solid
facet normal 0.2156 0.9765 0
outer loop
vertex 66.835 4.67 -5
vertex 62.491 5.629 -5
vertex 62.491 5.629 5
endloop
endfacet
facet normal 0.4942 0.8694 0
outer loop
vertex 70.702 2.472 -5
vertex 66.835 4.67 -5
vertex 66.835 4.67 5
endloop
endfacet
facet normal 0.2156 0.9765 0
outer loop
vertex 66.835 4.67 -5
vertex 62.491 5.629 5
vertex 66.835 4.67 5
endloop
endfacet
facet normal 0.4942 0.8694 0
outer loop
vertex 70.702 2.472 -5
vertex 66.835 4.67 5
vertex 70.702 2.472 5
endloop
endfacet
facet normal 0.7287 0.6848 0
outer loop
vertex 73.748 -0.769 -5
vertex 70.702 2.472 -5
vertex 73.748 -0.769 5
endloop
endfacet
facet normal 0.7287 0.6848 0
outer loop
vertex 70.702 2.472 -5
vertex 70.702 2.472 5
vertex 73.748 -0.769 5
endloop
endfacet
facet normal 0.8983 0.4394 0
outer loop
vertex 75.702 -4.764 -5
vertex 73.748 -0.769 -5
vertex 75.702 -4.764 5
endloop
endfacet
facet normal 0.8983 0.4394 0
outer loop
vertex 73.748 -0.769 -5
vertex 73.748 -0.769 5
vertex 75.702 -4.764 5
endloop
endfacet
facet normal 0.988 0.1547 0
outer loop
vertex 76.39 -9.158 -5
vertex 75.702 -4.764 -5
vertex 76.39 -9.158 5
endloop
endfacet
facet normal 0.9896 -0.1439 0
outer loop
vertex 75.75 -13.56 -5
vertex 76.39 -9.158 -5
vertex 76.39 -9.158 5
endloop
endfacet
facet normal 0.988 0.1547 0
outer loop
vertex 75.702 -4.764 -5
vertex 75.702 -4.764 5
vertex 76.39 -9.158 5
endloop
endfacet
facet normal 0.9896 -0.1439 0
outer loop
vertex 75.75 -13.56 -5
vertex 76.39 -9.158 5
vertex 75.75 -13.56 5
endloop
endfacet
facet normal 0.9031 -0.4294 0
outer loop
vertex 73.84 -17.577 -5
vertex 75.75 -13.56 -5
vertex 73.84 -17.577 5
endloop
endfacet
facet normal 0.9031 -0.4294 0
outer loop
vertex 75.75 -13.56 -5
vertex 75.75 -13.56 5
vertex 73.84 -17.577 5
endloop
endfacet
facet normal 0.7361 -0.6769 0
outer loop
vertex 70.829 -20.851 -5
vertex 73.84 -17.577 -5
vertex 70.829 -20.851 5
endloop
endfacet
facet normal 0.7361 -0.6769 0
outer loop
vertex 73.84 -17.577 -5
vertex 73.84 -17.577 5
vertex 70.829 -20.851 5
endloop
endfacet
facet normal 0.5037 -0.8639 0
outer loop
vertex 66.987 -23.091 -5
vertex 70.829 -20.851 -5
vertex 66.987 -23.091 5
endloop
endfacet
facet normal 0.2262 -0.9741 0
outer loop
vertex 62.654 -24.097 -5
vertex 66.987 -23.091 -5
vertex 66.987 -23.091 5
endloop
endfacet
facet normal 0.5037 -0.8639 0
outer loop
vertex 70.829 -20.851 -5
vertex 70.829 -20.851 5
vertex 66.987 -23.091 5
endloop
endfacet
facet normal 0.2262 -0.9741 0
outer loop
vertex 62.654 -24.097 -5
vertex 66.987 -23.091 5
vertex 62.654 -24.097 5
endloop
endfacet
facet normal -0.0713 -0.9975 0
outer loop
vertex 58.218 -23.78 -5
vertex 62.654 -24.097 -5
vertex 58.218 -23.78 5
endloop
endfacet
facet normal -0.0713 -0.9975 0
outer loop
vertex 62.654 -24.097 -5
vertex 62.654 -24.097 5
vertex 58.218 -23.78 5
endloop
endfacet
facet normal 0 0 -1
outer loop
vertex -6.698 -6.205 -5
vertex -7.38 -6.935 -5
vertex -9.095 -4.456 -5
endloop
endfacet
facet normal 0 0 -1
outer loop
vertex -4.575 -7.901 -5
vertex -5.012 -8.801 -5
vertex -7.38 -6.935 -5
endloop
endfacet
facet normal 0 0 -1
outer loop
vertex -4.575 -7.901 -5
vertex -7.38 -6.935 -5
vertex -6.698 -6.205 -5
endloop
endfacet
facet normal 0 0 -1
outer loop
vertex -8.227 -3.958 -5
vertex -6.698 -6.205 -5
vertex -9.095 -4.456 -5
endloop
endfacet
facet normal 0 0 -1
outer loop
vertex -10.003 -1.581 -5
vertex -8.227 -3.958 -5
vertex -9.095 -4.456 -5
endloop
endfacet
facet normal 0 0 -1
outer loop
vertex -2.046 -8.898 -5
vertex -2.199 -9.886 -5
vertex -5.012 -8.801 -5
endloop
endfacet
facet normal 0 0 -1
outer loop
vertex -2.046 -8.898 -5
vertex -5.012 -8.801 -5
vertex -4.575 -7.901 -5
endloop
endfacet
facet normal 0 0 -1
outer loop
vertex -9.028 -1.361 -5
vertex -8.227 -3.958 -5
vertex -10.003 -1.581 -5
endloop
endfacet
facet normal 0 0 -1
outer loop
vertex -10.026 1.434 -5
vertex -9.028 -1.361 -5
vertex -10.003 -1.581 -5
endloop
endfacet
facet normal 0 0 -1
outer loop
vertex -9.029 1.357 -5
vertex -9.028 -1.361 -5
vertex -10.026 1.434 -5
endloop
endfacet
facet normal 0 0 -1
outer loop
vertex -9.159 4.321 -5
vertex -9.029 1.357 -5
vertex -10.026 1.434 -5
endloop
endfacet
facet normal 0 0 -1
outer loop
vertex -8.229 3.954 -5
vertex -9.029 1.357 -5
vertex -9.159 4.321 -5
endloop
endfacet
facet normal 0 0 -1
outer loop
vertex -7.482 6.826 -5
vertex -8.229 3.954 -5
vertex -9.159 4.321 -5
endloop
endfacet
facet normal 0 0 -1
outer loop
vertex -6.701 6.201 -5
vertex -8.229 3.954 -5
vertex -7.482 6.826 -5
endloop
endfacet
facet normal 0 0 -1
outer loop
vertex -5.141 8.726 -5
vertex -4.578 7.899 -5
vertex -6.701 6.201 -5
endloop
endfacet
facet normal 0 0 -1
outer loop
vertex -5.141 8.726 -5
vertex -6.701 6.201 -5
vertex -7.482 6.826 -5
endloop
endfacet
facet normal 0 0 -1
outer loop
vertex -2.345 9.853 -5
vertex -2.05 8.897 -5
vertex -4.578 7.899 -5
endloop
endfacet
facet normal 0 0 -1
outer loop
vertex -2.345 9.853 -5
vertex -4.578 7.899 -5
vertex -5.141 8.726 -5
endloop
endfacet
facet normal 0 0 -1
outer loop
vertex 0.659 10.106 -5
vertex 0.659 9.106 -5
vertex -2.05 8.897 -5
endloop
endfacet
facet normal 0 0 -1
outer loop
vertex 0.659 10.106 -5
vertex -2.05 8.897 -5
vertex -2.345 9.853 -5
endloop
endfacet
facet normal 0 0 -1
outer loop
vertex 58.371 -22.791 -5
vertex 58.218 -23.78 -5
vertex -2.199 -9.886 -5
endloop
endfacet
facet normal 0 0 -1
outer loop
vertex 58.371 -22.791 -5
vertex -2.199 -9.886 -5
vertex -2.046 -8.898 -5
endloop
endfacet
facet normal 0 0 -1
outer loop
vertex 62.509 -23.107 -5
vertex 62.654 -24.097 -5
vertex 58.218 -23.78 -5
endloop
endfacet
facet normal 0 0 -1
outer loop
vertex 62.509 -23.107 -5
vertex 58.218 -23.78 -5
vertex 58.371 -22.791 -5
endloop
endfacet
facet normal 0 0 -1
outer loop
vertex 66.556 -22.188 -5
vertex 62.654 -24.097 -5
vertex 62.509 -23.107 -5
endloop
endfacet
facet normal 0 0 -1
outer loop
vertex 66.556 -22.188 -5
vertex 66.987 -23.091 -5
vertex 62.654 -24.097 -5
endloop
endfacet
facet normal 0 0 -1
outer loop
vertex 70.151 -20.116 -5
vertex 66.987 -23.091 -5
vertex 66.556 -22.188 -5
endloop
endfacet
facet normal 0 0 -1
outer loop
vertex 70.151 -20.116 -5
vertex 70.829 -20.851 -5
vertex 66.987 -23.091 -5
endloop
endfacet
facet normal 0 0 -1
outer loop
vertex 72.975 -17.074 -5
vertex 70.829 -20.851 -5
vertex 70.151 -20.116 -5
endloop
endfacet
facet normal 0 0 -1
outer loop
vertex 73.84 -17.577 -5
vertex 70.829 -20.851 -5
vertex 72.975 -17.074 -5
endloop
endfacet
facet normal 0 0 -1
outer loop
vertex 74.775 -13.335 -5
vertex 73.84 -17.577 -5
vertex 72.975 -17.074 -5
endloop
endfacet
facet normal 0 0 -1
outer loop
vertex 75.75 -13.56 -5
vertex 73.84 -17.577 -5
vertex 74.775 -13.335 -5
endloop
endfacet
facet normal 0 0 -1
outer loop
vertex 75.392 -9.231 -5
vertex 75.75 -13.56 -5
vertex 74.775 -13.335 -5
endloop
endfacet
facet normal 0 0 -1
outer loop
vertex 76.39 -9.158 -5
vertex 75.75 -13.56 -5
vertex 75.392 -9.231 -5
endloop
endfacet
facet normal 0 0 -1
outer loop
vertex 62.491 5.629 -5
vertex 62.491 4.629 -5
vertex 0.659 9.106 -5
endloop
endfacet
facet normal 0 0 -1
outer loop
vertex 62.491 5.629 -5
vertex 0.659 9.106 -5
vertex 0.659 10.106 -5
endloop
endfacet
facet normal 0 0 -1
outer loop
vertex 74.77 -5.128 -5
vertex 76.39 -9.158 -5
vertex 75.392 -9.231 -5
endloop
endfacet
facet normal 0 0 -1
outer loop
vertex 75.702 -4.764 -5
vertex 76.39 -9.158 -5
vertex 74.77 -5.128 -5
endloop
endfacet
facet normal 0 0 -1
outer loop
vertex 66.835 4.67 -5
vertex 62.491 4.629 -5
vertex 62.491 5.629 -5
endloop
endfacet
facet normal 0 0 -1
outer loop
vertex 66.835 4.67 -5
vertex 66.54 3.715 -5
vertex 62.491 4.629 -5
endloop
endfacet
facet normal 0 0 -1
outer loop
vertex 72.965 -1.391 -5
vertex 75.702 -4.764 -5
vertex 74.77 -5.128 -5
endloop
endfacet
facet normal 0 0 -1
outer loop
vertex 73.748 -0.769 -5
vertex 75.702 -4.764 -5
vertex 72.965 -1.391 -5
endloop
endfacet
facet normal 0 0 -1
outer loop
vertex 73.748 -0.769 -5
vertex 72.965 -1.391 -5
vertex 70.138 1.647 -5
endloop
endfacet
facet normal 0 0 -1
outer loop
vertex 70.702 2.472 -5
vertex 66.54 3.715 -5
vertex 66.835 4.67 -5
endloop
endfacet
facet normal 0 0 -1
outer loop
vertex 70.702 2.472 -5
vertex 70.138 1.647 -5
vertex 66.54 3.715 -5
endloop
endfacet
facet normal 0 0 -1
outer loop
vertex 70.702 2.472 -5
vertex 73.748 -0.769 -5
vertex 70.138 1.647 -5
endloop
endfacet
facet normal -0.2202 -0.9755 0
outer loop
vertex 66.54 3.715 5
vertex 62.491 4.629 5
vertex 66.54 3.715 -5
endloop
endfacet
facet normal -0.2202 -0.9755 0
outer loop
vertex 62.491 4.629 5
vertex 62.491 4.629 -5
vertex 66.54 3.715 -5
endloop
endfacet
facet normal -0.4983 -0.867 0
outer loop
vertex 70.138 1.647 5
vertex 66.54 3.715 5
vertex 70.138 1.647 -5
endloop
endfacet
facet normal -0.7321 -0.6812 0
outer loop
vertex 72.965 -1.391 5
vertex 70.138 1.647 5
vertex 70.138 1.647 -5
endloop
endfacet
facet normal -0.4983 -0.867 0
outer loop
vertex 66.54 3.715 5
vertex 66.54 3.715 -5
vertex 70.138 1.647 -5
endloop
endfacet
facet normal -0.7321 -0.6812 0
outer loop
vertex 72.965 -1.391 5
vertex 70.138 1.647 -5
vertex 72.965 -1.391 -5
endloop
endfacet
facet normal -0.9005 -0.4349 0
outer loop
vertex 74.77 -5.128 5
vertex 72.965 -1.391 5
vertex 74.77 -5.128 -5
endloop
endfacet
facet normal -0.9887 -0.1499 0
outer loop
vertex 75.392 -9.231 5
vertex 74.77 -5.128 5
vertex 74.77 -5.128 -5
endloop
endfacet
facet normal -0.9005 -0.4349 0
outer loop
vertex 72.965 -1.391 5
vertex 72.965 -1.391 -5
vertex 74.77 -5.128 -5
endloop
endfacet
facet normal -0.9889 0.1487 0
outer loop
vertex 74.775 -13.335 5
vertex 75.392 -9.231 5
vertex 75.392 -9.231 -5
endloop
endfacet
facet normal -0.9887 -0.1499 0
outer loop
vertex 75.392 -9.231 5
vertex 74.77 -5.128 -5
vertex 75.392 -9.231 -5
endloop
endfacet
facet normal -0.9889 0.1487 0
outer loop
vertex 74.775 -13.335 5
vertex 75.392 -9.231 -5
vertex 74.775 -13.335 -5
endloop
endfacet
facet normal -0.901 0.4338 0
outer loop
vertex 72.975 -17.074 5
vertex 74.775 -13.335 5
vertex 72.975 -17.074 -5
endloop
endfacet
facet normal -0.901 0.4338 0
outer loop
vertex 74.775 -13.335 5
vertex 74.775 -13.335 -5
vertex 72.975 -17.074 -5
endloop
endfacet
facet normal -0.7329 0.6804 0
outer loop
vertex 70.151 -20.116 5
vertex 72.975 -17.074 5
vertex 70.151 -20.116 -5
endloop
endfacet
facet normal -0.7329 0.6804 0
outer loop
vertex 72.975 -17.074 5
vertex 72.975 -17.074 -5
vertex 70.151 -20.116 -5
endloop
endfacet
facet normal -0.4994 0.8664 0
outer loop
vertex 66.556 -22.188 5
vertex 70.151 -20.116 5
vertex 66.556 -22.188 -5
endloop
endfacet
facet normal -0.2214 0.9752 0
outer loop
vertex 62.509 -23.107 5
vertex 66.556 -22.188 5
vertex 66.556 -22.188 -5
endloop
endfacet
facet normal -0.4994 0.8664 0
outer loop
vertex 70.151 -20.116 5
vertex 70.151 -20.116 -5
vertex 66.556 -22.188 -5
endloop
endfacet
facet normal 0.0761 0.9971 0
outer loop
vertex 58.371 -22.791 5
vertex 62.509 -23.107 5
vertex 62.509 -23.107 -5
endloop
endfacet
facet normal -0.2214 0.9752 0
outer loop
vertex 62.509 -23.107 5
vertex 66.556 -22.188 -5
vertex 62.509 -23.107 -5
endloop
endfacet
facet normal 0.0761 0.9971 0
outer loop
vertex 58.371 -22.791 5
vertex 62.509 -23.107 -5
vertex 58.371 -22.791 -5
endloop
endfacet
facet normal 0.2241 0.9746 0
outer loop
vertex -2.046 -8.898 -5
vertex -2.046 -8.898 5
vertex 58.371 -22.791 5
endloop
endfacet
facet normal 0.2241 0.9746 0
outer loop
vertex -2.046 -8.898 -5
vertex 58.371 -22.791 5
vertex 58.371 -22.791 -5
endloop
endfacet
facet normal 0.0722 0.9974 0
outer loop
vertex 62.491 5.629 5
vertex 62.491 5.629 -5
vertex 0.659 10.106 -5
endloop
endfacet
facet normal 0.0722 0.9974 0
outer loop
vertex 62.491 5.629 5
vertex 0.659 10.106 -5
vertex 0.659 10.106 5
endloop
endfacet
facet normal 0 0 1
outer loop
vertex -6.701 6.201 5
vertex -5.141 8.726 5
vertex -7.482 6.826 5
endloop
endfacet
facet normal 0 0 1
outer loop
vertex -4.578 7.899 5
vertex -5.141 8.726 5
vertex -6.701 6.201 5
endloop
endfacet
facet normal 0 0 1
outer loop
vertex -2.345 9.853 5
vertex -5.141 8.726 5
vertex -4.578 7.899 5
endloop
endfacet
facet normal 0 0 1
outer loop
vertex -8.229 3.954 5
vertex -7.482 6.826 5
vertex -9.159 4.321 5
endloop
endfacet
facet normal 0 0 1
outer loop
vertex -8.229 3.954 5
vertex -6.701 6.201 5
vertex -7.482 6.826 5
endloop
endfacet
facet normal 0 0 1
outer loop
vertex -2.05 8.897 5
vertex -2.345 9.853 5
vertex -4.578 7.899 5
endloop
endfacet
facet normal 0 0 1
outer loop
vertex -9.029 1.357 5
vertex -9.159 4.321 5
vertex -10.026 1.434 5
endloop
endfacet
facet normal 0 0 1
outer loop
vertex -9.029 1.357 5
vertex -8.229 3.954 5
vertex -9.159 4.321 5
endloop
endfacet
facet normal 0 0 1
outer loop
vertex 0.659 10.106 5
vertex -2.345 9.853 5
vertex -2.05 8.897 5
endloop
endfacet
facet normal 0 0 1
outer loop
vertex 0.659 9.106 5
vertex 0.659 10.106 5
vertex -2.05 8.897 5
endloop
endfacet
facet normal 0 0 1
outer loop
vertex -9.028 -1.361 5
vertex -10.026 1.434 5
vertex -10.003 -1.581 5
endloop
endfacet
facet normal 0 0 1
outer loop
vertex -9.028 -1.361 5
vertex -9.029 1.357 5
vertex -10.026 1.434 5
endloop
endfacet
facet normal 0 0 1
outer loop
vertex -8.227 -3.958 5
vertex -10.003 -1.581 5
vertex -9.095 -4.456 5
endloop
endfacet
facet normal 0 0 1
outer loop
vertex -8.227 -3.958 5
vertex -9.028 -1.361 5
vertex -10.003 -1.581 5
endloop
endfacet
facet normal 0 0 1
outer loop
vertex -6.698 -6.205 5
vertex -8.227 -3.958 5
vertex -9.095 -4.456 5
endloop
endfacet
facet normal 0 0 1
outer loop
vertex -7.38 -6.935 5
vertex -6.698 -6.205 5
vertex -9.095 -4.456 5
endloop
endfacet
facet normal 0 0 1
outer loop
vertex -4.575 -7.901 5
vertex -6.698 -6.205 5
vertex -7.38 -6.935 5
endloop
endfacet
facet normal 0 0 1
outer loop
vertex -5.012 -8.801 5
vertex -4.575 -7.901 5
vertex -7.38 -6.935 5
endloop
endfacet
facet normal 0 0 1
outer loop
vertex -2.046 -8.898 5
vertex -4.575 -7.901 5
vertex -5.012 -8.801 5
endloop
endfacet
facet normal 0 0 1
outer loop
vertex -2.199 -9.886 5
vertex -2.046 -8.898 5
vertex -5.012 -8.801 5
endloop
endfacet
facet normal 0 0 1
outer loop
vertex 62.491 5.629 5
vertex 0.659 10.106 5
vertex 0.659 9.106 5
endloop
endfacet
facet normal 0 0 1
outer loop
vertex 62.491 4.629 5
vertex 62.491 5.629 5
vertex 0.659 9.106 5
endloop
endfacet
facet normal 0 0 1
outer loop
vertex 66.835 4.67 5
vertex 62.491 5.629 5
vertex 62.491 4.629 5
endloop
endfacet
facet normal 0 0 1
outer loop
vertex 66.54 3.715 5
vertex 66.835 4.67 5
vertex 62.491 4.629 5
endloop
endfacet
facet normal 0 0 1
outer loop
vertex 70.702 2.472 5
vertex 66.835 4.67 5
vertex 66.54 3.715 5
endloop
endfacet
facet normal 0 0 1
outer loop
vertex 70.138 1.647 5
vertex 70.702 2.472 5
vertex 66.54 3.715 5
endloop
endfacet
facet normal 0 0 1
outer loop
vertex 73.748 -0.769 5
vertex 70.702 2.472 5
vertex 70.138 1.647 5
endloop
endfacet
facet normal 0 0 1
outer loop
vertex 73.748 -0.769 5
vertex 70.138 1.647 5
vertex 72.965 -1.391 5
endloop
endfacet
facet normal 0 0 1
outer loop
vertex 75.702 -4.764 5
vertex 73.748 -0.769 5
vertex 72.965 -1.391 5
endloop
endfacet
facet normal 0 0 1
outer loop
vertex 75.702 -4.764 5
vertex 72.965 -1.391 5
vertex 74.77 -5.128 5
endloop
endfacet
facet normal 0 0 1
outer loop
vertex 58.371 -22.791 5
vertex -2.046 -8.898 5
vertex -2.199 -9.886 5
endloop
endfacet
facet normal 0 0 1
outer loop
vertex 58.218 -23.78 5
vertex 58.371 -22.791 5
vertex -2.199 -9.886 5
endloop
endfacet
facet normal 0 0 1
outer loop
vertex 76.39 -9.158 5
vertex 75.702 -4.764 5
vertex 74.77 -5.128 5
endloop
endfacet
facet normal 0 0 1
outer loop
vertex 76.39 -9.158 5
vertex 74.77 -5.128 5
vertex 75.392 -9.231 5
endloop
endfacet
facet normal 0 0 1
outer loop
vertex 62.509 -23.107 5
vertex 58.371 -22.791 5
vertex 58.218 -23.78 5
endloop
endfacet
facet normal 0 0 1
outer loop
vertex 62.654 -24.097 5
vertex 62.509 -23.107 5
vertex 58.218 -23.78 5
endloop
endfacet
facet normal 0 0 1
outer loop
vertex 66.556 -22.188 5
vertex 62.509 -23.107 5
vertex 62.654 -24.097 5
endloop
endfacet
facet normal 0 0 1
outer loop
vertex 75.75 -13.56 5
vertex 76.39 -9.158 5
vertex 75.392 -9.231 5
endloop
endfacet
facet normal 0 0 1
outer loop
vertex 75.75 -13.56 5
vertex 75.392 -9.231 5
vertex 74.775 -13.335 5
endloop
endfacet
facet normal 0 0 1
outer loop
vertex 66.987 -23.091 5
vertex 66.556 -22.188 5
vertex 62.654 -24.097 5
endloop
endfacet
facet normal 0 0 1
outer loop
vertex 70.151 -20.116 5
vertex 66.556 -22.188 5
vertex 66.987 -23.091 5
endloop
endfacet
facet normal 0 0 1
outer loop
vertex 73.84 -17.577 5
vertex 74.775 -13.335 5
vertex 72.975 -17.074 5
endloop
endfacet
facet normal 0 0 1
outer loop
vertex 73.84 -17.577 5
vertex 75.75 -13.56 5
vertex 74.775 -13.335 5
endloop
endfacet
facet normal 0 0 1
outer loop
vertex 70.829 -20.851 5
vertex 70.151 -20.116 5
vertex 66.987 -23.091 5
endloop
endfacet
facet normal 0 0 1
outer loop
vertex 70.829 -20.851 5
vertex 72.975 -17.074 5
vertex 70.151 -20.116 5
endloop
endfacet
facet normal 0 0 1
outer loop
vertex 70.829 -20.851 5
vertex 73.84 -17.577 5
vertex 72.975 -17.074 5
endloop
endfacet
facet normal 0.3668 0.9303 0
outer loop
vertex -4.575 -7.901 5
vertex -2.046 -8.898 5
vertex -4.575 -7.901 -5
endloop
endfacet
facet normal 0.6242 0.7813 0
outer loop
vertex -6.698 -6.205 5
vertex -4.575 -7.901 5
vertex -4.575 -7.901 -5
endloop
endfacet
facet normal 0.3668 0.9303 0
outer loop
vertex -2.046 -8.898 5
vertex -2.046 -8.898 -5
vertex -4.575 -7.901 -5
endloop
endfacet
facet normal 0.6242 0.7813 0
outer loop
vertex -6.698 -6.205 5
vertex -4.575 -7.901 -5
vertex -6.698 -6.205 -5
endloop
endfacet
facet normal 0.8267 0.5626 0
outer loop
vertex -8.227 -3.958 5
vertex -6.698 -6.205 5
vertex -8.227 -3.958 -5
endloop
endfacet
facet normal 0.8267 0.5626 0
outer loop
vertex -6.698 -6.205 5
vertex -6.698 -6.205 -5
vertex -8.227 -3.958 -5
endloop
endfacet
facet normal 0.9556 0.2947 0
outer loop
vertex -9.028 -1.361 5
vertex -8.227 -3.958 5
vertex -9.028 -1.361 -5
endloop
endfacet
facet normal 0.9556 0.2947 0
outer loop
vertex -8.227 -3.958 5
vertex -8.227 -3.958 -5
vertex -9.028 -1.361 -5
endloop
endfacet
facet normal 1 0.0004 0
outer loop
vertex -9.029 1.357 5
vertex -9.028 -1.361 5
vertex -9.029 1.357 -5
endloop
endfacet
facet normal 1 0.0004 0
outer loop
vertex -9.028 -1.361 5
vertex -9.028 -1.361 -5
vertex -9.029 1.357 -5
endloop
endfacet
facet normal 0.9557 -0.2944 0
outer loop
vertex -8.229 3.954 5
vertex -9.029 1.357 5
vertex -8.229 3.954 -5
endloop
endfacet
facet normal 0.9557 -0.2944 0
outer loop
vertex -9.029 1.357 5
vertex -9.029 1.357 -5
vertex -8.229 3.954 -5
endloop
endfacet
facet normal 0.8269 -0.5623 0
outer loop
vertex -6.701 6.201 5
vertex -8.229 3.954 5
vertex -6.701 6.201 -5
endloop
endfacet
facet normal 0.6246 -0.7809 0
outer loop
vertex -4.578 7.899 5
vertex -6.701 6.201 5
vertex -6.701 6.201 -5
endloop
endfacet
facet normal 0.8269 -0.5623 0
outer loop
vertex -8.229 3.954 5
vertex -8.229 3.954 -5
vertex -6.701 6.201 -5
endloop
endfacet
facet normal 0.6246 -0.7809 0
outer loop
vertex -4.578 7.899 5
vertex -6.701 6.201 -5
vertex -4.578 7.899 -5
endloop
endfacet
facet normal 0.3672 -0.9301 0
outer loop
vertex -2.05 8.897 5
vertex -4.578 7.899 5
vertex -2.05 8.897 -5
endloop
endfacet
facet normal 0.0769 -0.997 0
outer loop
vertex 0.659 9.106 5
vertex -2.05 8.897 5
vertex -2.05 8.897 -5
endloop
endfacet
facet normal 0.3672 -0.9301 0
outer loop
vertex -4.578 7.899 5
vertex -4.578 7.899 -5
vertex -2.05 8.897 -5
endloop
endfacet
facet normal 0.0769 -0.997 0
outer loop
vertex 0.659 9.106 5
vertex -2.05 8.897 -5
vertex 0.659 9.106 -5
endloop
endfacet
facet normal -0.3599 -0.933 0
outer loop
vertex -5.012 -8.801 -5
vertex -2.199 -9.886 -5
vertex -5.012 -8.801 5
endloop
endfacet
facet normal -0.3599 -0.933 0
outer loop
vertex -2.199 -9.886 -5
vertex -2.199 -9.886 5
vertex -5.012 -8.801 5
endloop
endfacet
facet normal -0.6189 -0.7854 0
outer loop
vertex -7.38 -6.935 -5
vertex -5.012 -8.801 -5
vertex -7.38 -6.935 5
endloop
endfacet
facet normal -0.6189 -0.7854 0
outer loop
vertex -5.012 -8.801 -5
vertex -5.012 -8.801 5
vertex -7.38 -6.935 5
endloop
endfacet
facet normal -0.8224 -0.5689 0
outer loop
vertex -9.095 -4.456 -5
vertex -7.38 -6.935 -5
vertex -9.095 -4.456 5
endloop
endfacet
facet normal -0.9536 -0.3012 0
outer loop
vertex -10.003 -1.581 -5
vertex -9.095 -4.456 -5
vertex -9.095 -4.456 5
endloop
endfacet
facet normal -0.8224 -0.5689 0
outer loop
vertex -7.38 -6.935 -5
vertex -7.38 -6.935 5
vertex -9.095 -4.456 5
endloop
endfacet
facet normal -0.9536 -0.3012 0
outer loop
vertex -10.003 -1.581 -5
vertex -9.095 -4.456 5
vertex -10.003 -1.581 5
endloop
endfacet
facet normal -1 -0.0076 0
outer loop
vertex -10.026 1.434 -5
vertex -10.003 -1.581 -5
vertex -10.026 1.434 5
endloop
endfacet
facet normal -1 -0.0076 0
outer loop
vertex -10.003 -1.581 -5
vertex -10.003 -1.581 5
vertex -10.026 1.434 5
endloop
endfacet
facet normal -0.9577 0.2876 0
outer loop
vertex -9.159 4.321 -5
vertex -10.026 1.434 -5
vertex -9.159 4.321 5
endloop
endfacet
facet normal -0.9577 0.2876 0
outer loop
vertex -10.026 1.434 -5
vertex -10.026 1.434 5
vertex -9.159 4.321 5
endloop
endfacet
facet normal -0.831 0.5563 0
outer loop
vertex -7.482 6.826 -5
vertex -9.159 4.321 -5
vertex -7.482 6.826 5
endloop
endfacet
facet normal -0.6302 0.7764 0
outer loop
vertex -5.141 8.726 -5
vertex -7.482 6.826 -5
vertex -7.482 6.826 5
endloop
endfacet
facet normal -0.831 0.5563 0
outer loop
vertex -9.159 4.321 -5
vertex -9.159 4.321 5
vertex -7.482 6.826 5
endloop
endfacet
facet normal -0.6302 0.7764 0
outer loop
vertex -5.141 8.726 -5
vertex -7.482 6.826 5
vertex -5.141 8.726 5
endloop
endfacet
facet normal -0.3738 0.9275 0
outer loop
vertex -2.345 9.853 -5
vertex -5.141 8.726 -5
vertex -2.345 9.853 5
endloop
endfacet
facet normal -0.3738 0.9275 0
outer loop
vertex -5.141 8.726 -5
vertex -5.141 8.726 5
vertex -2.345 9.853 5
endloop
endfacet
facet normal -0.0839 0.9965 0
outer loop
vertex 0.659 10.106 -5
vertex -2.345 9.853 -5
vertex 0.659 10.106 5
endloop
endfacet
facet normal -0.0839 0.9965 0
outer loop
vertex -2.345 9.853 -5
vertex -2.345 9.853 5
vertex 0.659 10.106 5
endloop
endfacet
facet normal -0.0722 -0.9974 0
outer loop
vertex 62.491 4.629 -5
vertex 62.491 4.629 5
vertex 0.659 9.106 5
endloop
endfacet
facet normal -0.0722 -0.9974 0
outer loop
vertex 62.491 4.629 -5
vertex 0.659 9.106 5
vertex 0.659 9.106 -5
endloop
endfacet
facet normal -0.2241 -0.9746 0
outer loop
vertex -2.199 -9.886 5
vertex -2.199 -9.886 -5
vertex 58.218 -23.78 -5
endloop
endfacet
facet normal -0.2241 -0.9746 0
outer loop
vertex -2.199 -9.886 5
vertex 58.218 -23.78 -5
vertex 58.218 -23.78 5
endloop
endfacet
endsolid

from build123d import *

# Parameters (mm, degrees)
CROQUIS3_W = 10
CROQUIS3_H = 1


with BuildPart() as part:
    # Barrer1: sweep along a path in Croquis2
    with BuildLine(Plane.XY) as barrer1_path:
        Line((0.659407884, 9.106156228), (62.491462424, 4.628685909))
        ThreePointArc((62.491462424, 4.628685909), (75.23778781, -11.306375083), (58.370917042, -22.79130652))
        Line((58.370917042, -22.79130652), (-2.046135399, -8.897765446))
        ThreePointArc((-2.046135399, -8.897765446), (-9.028624048, 1.356778461), (0.659407884, 9.106156228))
    # Croquis3 → Barrer1 (sweep)
    with BuildSketch(Plane(origin=(0.659407884, 0, 0), x_dir=(0, 0, -1), z_dir=(1, 0, 0))):
        with Locations((0, 9.606156228)):
            Rectangle(CROQUIS3_W, CROQUIS3_H)
    sweep(path=barrer1_path.line)


solid = part.part
